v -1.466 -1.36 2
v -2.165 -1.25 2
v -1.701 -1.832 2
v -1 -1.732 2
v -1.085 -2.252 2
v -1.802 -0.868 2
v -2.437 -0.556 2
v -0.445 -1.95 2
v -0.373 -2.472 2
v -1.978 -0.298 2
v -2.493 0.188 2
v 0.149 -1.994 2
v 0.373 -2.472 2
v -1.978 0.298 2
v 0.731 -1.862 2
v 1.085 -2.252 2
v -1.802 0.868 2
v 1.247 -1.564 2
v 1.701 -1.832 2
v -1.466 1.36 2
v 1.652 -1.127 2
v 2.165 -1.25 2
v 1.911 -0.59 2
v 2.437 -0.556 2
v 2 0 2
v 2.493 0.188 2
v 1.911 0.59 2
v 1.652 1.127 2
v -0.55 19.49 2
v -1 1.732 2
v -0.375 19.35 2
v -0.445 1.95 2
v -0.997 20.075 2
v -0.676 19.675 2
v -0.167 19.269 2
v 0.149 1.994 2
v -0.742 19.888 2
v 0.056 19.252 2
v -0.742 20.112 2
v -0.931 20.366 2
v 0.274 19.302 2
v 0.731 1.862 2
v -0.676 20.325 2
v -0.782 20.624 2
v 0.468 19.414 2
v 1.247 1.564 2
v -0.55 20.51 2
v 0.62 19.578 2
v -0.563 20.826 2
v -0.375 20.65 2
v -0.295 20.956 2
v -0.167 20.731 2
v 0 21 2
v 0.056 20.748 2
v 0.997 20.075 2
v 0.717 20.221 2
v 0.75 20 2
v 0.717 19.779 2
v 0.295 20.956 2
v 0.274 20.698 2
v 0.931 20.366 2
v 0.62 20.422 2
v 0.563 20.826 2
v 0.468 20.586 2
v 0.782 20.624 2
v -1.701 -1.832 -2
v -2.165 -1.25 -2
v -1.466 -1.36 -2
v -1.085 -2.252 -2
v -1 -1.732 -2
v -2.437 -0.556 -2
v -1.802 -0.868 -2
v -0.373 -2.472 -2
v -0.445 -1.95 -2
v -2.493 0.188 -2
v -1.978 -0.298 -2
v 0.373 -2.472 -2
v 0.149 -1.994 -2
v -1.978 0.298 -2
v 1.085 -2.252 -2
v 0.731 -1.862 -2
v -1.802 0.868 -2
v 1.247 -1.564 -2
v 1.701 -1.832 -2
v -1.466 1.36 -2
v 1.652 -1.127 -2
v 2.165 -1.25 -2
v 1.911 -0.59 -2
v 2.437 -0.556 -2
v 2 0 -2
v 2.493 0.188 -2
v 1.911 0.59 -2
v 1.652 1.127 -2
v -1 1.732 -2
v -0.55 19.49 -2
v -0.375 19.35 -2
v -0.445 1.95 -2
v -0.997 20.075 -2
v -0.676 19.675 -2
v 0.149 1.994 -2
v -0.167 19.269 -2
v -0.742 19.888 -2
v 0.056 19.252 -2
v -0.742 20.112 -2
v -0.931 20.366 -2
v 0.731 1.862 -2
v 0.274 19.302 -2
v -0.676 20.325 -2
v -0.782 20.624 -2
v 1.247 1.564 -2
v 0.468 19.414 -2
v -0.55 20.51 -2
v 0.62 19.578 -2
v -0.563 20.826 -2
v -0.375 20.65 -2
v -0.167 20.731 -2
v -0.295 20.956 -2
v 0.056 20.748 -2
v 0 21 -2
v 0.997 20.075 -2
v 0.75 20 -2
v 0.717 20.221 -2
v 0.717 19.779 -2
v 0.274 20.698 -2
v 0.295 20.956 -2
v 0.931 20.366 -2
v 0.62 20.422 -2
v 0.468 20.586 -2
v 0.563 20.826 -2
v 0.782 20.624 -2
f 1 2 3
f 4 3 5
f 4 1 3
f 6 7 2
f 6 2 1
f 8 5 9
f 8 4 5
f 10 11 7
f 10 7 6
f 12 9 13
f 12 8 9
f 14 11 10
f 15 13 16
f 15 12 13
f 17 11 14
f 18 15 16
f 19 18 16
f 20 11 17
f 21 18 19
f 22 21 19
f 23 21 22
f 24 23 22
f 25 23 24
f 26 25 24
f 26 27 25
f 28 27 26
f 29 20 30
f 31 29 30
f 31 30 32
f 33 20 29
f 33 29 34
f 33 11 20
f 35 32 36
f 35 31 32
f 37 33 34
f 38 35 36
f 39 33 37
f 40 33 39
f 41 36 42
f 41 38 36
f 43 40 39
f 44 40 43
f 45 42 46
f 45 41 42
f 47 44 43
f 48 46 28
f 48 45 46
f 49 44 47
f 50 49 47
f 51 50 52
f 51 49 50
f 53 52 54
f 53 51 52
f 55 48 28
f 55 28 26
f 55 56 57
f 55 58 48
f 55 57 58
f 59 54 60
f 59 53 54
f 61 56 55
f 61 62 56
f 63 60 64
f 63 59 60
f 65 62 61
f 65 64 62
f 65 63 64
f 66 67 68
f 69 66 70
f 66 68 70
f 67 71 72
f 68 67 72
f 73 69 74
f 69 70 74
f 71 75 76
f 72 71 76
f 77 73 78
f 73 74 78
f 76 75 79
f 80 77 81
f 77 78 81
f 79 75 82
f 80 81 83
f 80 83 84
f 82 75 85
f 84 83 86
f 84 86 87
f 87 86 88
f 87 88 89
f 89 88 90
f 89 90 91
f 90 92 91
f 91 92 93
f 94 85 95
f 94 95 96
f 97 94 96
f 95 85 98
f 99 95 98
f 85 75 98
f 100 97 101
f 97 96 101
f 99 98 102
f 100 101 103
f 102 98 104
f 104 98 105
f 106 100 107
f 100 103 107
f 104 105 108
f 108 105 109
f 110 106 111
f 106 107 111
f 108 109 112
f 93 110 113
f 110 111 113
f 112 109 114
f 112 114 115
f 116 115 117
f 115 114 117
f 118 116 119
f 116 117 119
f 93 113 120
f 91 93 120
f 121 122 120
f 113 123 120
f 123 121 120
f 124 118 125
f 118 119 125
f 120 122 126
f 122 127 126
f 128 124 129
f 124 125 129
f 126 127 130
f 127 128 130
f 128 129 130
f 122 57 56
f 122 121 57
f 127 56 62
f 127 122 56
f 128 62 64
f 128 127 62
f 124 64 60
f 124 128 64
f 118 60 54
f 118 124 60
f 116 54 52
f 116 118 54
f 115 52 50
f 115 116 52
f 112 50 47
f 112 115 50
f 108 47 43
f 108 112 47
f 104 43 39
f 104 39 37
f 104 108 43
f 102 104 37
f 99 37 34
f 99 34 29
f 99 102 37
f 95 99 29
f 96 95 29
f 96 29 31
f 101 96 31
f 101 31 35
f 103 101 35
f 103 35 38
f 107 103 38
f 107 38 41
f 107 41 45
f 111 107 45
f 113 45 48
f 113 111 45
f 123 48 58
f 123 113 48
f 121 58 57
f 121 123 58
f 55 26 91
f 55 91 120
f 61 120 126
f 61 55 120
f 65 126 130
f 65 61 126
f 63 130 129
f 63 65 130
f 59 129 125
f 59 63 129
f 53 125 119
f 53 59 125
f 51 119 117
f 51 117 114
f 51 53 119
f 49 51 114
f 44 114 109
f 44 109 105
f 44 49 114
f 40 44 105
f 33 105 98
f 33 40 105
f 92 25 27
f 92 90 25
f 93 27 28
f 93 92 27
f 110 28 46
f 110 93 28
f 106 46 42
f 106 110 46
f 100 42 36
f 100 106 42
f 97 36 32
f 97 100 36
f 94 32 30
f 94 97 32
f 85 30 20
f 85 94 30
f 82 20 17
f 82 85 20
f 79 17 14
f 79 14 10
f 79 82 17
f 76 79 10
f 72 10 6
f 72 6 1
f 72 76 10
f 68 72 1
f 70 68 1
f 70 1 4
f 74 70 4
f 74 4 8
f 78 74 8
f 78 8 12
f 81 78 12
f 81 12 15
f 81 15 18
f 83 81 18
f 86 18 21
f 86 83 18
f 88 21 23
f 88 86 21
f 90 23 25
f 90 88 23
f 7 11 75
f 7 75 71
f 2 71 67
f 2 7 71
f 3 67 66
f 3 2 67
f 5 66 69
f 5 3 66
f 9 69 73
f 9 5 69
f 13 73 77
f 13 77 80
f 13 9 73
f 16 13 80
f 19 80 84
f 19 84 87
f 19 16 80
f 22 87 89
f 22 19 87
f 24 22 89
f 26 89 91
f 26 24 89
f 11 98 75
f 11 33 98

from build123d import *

# Parameters (mm, degrees)
IZIM1_R                     = 0.75
IZIM1_R_2                   = 2.5
IZIM1_R_3                   = 2
Y_KSEKLIK_EKSTR_ZYON1_DEPTH = 2


with BuildPart() as part:
    # Çizim1 → Yükseklik-Ekstrüzyon1 (new body, symmetric)
    with BuildSketch(Plane.XY):
        with BuildLine():
            Line((-0.997183534, 20.075), (-2.492958834, 0.1875))
            ThreePointArc((-2.492958834, 0.1875), (0, 2.5), (2.492958834, 0.1875))
            Line((2.492958834, 0.1875), (0.997183534, 20.075))
            ThreePointArc((0.997183534, 20.075), (0, 21), (-0.997183534, 20.075))
        make_face()
        with Locations((0, 20)):
            Circle(IZIM1_R, mode=Mode.SUBTRACT)
        Circle(IZIM1_R_2)
        Circle(IZIM1_R_3, mode=Mode.SUBTRACT)
    extrude(amount=Y_KSEKLIK_EKSTR_ZYON1_DEPTH, both=True)


solid = part.part
